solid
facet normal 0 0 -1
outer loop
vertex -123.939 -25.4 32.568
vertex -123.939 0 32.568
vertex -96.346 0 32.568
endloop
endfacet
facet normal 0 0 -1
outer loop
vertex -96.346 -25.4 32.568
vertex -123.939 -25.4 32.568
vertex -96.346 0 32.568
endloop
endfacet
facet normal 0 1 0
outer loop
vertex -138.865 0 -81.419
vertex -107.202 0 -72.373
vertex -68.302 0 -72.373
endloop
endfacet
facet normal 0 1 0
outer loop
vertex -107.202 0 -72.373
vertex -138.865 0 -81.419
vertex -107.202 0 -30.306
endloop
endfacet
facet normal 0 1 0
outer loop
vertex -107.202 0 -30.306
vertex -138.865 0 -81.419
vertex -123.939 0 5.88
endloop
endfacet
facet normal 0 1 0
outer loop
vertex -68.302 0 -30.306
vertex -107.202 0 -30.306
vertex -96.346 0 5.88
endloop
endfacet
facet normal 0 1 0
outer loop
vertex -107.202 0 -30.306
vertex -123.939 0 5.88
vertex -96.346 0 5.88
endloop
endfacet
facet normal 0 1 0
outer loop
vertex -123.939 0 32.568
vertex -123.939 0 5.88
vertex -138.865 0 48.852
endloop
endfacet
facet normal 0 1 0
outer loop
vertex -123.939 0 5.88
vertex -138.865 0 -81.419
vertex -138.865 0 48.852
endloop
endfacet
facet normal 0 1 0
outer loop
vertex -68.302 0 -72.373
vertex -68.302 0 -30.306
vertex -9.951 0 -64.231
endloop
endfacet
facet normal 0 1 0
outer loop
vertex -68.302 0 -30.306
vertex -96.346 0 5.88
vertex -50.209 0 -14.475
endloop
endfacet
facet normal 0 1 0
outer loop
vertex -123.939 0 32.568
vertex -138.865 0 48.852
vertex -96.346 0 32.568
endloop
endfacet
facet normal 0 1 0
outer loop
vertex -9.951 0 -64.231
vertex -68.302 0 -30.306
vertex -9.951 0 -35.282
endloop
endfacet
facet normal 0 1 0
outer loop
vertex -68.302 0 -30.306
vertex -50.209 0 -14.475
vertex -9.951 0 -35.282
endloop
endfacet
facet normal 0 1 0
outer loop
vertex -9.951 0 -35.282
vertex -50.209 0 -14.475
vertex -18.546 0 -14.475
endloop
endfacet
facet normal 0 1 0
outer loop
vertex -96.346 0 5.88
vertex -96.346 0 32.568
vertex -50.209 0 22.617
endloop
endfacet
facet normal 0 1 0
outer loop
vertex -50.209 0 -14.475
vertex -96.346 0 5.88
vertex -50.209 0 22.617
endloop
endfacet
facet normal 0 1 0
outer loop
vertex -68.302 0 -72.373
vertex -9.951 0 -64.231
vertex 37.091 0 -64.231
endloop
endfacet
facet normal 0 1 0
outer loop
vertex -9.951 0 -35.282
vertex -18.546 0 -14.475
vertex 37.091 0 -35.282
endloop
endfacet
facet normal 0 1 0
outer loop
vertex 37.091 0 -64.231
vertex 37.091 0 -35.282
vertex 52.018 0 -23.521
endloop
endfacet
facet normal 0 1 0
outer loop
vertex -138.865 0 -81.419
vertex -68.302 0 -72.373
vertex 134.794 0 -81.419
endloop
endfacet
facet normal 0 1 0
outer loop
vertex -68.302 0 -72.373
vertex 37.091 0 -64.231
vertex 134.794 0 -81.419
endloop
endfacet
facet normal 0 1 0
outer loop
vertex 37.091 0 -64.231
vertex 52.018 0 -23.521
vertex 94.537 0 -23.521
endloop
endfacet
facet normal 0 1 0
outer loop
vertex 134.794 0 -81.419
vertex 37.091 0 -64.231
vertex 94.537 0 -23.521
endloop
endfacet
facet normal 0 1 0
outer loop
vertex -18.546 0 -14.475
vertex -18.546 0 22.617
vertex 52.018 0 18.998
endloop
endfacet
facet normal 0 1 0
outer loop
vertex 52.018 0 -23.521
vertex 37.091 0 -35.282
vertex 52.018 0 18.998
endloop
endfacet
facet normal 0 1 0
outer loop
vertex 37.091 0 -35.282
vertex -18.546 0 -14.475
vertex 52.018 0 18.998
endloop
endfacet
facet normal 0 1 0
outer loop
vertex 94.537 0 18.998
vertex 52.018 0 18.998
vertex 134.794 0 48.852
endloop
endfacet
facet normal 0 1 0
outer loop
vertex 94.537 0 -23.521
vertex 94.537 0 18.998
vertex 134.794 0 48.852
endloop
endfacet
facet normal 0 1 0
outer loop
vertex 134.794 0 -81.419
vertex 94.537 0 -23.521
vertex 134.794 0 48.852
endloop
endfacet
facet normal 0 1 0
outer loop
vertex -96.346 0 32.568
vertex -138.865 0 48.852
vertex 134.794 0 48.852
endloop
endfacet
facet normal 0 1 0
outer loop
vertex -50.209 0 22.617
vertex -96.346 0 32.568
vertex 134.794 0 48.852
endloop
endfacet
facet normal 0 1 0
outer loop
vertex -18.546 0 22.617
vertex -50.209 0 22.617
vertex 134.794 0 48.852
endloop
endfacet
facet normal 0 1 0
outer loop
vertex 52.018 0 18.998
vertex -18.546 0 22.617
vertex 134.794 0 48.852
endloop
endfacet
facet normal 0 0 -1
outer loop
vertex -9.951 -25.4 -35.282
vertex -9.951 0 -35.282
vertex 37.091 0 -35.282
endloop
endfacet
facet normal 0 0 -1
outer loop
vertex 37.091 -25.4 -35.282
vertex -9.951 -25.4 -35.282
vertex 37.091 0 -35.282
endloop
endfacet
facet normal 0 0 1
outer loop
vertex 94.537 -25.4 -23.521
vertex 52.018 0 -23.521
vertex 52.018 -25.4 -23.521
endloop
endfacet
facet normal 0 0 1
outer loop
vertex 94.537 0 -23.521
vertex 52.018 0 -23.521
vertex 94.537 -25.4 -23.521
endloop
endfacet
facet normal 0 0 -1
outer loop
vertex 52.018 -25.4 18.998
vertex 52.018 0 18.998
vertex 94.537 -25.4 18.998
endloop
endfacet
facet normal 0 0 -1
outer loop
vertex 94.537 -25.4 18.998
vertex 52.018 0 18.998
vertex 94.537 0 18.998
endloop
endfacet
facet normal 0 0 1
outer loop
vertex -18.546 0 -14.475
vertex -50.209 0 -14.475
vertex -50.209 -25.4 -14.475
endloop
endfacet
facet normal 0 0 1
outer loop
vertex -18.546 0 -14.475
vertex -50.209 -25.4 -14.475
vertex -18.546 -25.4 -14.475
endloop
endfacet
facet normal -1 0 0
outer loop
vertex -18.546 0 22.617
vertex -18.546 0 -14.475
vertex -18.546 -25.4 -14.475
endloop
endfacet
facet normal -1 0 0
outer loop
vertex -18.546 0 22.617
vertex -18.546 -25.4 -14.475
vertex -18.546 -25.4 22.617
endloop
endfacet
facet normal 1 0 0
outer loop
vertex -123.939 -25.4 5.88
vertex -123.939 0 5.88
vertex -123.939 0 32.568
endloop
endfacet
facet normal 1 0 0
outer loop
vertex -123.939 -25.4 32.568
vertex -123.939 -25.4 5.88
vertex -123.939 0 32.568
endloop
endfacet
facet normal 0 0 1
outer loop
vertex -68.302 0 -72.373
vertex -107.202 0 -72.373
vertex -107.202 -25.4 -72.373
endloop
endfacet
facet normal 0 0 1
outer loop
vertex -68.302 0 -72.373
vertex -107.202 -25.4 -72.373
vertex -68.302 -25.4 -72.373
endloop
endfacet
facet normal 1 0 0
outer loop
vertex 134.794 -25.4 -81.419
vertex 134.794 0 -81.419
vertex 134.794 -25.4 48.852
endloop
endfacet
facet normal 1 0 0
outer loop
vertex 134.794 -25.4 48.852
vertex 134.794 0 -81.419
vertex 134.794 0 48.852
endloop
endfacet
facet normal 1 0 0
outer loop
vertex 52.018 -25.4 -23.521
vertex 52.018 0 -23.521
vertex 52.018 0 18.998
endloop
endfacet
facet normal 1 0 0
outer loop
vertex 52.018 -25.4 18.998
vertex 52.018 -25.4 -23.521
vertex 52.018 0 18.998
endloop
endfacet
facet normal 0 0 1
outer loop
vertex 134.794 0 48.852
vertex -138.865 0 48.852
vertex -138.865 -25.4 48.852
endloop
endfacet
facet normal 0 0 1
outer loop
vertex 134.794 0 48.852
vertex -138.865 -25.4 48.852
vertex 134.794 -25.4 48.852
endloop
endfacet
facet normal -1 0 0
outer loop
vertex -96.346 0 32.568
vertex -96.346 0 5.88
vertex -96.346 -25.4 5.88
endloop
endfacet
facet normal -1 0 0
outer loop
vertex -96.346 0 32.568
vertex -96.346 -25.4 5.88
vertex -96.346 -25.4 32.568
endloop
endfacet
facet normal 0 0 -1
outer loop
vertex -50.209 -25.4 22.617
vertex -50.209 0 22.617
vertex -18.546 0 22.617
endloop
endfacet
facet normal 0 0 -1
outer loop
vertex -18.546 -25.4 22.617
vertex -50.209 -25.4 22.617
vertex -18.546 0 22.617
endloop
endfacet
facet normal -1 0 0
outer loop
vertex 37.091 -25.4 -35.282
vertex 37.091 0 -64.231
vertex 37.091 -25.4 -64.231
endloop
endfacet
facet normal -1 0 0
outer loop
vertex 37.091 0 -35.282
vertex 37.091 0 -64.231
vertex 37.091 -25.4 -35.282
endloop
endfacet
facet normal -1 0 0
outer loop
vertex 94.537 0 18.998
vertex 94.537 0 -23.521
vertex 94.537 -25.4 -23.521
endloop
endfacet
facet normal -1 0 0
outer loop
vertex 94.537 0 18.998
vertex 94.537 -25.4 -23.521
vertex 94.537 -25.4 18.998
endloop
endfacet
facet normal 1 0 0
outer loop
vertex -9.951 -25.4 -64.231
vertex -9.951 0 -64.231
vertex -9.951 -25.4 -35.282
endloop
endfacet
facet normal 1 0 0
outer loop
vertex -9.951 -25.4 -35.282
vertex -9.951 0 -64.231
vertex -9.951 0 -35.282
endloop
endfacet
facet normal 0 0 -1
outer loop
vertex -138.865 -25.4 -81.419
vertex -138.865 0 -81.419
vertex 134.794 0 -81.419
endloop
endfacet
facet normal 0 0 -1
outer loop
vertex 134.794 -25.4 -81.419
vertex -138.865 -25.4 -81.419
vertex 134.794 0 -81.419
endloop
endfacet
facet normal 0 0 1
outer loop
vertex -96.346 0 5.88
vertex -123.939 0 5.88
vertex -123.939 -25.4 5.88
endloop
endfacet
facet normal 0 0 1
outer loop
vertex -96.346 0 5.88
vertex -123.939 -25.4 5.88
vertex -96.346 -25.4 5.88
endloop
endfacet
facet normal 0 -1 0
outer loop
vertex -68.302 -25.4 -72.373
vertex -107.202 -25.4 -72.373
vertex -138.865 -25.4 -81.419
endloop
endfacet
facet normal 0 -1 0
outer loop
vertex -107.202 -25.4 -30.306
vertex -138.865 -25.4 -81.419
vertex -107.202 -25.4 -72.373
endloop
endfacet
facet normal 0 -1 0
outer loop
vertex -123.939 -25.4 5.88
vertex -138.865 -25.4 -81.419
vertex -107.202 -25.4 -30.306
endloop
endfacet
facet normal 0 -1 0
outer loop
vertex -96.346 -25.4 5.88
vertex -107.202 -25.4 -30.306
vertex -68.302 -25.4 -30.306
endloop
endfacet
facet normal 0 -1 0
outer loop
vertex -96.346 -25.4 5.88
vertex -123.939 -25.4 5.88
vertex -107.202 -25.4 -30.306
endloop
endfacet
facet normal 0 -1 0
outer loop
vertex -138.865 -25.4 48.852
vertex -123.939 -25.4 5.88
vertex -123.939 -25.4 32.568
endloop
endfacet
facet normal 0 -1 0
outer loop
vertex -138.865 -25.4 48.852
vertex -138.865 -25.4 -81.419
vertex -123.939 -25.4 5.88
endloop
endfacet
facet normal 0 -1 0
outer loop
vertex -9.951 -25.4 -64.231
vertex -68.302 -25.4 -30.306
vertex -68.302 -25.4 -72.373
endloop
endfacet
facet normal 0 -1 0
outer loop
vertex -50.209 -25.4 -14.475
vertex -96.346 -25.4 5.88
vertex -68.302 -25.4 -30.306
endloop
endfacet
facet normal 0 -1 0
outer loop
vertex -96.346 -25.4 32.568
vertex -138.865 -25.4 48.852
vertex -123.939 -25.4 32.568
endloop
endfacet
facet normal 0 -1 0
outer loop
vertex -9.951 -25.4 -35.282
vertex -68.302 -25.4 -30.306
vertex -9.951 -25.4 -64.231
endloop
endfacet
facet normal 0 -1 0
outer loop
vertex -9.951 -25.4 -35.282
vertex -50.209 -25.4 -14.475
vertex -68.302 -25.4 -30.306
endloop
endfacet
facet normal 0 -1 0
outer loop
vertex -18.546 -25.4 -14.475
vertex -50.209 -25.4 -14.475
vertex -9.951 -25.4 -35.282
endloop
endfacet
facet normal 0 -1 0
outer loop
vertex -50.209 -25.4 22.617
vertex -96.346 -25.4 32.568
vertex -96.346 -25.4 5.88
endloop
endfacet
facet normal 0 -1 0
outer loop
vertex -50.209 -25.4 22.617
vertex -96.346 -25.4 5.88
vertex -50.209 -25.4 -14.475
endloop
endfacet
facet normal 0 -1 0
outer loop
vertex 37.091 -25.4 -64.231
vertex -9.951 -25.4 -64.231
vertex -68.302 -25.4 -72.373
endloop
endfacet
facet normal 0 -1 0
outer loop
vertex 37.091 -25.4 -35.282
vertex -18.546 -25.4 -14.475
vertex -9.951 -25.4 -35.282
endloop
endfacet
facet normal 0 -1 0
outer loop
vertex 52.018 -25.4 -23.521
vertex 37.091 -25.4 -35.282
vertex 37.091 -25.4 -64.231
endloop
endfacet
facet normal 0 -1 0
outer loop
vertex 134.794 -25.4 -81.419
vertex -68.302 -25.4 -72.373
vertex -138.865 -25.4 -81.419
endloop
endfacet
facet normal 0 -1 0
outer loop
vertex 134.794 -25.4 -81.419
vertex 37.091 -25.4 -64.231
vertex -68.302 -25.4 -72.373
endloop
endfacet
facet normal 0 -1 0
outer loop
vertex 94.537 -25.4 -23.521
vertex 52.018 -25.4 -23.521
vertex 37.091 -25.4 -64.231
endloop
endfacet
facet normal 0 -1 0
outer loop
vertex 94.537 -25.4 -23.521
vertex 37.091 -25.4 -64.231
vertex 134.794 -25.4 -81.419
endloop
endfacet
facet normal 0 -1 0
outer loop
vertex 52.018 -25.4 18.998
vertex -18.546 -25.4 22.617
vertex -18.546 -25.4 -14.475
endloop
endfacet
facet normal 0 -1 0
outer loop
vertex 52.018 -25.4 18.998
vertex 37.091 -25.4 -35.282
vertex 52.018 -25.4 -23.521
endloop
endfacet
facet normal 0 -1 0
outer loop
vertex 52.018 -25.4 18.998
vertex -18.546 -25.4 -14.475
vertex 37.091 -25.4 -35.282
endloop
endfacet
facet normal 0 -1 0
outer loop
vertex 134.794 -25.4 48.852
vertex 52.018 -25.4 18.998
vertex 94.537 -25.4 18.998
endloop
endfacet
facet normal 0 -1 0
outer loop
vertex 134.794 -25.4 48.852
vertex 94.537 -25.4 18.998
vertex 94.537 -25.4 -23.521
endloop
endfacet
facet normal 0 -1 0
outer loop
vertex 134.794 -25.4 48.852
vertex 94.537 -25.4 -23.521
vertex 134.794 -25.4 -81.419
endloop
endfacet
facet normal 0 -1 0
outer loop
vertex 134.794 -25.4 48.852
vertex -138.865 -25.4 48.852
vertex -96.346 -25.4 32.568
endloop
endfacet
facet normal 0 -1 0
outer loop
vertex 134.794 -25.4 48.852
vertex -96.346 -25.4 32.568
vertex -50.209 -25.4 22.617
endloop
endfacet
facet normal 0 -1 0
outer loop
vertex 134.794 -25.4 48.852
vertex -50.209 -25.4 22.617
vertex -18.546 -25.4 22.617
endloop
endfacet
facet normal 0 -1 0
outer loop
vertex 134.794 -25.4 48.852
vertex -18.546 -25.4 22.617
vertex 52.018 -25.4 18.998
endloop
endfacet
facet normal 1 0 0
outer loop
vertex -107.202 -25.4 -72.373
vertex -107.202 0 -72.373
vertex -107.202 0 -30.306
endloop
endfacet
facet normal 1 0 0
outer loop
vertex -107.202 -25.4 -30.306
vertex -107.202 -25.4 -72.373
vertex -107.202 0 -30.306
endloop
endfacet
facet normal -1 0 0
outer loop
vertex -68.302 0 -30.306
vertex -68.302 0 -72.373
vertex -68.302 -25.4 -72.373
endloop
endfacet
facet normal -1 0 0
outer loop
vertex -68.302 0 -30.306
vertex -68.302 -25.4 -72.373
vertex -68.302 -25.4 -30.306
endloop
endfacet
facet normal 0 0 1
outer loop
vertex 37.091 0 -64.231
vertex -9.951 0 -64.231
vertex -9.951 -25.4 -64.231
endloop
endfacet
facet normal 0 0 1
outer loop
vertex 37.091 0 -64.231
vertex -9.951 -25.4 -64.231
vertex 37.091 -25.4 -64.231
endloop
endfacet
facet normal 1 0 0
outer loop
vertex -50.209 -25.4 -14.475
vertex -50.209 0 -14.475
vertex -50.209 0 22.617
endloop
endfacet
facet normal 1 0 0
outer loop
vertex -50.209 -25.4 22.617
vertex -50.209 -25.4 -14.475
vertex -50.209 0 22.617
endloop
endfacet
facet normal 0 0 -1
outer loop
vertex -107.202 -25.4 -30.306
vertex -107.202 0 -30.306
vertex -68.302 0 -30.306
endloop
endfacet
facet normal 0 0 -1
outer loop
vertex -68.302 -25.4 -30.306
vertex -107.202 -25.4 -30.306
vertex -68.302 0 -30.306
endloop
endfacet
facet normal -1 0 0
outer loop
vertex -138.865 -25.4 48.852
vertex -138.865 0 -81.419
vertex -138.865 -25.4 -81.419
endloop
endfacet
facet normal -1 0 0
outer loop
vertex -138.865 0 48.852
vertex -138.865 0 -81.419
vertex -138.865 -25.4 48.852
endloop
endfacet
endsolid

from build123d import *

# Parameters (mm, degrees)
F0_W     = 273.6599
F0_H     = 130.27117
F0_W_2   = 38.90042
F0_H_2   = 42.066727
F0_W_3   = 47.042365
F0_H_3   = 28.949149
F0_W_4   = 31.663131
F0_H_4   = 37.091095
F0_W_5   = 27.592152
F0_H_5   = 26.687497
F0_W_6   = 42.519059
F0_H_6   = 42.519063
F1_DEPTH = 25.4


with BuildPart() as f1:
    # F0 (on Front) → F1 (new body)
    with BuildSketch(Plane.XZ):
        with Locations((-2.035491, -16.283898)):
            Rectangle(F0_W, F0_H)
        with Locations((-87.752104, -51.339505)):
            Rectangle(F0_W_2, F0_H_2, mode=Mode.SUBTRACT)
        with Locations((13.569912, -49.756351)):
            Rectangle(F0_W_3, F0_H_3, mode=Mode.SUBTRACT)
        with Locations((-34.377114, 4.070974)):
            Rectangle(F0_W_4, F0_H_4, mode=Mode.SUBTRACT)
        with Locations((-110.142462, 19.224043)):
            Rectangle(F0_W_5, F0_H_5, mode=Mode.SUBTRACT)
        with Locations((73.277535, -2.261653)):
            Rectangle(F0_W_6, F0_H_6, mode=Mode.SUBTRACT)
    extrude(amount=F1_DEPTH)


solid = f1.part
